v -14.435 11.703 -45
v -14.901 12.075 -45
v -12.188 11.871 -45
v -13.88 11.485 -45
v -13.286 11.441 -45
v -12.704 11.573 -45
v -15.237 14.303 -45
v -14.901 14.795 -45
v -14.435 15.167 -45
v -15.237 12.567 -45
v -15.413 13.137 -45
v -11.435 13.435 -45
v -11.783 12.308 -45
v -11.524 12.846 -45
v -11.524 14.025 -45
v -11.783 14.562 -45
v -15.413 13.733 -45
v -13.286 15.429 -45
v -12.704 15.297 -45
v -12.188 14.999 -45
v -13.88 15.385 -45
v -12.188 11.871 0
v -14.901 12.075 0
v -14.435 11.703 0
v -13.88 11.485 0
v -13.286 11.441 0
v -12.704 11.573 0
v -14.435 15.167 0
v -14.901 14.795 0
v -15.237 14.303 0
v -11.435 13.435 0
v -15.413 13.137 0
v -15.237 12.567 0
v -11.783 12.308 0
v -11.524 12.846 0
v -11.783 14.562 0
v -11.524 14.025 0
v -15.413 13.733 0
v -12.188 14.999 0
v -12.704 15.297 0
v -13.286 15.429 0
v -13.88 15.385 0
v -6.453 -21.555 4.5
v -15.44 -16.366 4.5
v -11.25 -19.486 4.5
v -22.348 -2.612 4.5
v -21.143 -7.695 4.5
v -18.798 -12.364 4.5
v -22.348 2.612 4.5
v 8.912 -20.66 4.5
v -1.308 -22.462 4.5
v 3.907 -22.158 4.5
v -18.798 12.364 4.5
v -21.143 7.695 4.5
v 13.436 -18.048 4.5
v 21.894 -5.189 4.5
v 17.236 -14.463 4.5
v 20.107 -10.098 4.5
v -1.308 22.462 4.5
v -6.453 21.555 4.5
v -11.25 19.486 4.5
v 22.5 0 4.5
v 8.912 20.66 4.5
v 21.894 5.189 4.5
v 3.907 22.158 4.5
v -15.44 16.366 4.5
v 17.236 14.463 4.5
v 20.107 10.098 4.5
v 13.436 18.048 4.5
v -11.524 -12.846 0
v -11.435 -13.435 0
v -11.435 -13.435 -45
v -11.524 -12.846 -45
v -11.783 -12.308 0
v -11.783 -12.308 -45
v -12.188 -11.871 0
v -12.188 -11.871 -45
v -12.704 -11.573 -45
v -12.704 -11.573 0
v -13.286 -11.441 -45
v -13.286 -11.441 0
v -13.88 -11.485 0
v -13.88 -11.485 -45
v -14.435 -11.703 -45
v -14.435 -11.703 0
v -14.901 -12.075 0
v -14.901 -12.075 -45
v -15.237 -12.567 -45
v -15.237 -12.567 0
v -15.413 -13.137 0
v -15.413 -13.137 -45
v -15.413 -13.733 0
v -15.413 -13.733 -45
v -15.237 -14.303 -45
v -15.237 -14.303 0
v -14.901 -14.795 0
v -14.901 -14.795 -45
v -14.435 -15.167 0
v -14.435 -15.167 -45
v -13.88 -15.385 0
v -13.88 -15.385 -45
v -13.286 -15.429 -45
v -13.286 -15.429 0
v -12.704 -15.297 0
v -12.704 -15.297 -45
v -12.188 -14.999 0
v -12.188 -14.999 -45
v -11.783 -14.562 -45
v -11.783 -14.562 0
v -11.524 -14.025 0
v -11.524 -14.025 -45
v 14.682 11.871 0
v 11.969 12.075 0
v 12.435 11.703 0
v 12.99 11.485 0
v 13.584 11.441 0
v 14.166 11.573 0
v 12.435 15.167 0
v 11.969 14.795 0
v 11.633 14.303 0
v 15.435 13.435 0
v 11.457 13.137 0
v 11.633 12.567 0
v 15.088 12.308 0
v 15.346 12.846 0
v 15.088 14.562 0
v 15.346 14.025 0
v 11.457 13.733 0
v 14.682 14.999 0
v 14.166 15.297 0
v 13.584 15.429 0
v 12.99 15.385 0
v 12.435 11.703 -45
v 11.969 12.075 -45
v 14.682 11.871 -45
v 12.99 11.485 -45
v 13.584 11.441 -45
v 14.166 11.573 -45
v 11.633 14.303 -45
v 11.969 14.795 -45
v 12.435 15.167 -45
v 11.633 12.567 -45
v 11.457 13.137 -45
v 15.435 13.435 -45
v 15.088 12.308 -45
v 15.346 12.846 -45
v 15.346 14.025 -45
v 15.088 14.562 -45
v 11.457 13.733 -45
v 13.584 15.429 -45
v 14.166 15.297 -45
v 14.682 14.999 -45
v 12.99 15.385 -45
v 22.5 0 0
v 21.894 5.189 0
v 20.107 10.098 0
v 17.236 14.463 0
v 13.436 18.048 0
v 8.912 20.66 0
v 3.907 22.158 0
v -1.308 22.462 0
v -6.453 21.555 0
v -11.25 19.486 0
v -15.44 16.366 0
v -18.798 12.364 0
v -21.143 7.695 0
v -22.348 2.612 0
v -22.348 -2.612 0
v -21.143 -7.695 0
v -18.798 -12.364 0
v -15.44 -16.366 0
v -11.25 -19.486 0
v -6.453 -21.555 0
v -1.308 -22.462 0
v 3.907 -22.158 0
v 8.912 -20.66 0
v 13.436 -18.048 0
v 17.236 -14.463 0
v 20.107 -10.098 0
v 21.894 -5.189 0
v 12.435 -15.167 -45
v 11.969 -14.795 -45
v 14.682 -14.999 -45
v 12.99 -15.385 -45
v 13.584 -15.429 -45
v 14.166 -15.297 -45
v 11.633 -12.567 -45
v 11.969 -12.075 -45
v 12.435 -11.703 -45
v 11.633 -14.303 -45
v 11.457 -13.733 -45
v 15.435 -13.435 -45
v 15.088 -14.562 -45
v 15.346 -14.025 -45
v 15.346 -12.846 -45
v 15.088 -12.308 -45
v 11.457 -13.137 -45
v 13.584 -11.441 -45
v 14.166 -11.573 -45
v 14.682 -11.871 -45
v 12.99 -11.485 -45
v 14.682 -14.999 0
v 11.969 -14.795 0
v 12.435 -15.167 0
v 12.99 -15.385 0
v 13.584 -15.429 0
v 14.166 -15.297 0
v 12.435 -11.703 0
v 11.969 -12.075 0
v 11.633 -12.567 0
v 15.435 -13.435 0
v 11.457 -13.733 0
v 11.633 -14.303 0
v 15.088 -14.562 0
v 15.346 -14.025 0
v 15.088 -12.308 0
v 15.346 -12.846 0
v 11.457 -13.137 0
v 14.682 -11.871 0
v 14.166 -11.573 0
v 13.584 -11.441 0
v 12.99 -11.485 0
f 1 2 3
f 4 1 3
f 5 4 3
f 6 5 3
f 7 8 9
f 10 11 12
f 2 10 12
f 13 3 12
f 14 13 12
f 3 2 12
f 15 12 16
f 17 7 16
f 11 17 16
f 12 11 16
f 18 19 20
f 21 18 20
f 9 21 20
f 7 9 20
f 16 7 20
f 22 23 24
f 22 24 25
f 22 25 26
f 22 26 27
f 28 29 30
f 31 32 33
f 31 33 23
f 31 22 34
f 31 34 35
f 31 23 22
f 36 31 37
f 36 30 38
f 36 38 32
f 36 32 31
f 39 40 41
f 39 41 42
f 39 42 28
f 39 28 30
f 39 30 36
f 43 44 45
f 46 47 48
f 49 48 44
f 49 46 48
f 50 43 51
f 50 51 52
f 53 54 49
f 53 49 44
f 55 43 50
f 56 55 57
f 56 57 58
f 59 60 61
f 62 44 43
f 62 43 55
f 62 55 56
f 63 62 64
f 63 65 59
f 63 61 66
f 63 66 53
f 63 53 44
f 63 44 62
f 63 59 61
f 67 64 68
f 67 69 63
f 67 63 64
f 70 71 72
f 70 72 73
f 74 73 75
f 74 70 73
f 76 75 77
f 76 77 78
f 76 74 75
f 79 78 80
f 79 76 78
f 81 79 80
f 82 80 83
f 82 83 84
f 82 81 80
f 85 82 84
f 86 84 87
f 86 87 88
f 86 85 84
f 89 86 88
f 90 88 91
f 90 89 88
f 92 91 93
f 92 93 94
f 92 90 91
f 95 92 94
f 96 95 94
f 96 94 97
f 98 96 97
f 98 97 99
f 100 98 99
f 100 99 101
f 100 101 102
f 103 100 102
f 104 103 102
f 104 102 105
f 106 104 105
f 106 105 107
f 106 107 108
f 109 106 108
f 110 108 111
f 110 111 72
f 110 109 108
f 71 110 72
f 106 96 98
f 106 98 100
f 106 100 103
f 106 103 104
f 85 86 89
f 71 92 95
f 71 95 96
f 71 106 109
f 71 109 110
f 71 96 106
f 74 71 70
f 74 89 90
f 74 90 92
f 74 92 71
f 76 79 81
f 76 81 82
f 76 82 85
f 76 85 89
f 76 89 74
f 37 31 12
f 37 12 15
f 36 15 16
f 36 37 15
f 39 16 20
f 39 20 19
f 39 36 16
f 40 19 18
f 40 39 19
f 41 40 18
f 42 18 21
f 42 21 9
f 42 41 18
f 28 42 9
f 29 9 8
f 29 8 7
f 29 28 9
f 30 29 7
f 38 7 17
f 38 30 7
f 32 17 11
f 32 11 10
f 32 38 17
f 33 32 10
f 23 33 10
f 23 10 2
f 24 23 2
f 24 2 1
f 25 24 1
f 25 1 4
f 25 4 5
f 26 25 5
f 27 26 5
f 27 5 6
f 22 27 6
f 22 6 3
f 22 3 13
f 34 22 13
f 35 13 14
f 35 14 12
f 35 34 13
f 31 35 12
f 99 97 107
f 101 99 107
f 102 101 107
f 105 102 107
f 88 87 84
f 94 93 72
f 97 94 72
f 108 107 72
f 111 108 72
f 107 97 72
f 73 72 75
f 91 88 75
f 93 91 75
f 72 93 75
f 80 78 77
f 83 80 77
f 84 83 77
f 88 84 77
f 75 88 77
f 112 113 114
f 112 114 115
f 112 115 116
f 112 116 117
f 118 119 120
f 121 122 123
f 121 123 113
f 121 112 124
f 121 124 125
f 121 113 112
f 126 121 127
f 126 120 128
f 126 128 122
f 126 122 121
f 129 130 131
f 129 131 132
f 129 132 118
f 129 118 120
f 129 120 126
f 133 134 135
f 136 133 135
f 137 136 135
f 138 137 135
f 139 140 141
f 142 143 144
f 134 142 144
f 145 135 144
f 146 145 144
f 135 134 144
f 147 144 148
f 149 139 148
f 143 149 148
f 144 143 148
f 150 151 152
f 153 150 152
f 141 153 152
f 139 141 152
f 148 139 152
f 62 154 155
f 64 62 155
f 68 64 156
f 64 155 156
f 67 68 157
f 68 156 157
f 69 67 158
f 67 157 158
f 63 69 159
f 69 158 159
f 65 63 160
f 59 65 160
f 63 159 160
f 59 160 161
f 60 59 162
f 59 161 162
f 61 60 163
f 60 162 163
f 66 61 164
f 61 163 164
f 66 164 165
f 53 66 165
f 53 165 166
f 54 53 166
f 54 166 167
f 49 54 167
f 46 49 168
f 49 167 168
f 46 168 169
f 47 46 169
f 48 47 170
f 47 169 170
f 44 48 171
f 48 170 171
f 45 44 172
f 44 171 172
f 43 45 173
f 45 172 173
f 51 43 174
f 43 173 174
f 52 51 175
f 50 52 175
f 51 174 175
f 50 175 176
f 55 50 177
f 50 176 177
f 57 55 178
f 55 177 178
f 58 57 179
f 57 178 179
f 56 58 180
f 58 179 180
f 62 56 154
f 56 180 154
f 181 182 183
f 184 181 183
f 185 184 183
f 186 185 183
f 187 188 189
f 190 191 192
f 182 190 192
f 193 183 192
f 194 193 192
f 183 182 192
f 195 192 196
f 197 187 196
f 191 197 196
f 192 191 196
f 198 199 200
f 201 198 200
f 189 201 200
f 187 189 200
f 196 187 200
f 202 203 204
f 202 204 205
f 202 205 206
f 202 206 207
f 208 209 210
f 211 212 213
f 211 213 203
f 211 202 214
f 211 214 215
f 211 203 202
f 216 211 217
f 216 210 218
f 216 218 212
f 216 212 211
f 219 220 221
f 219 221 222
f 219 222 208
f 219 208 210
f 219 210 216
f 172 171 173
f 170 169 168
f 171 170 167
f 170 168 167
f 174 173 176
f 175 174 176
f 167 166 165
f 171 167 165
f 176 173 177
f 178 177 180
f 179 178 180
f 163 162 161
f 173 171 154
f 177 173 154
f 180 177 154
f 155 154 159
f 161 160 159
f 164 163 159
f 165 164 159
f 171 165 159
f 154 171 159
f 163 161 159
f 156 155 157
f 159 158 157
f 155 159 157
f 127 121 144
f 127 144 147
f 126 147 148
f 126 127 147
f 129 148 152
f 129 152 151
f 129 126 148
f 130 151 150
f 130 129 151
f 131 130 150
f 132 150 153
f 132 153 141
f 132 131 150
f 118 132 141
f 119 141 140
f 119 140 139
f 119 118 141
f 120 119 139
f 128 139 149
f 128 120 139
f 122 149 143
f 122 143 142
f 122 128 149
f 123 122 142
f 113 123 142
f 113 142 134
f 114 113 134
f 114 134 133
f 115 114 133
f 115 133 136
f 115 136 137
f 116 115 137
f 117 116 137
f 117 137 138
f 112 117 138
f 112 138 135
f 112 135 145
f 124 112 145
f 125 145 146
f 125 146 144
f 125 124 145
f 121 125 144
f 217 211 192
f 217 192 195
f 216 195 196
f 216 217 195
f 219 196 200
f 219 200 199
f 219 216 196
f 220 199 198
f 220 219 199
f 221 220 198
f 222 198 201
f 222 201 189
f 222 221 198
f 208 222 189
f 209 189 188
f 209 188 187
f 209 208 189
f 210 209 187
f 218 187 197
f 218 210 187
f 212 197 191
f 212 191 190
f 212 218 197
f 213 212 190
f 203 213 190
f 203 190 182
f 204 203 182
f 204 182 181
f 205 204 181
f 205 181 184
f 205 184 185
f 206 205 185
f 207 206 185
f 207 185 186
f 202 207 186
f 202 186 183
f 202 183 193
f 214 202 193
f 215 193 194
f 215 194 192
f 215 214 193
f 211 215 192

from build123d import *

# Parameters (mm, degrees)
F0_R     = 22.5
F0_R_2   = 2
F1_DEPTH = 4.5
F2_DEPTH = 45


with BuildPart() as f1:
    # F0 (on Top) → F1 (new body)
    with BuildSketch(Plane.XY):
        Circle(F0_R)
        with Locations((-13.435029, -13.435029)):
            Circle(F0_R_2, mode=Mode.SUBTRACT)
        with Locations((13.435029, -13.435029)):
            Circle(F0_R_2, mode=Mode.SUBTRACT)
        with Locations((-13.435029, 13.435029)):
            Circle(F0_R_2, mode=Mode.SUBTRACT)
        with Locations((13.435029, 13.435029)):
            Circle(F0_R_2, mode=Mode.SUBTRACT)
        with Locations((-13.435029, 13.435029)):
            Circle(F0_R_2)
        with Locations((13.435029, 13.435029)):
            Circle(F0_R_2)
        with Locations((-13.435029, -13.435029)):
            Circle(F0_R_2)
        with Locations((13.435029, -13.435029)):
            Circle(F0_R_2)
    extrude(amount=F1_DEPTH)


with BuildPart() as f2:
    # F0 (on Top) → F2 (new body)
    with BuildSketch(Plane.XY):
        with Locations((-13.435029, -13.435029)):
            Circle(F0_R_2)
        with Locations((13.435029, -13.435029)):
            Circle(F0_R_2)
        with Locations((-13.435029, 13.435029)):
            Circle(F0_R_2)
        with Locations((13.435029, 13.435029)):
            Circle(F0_R_2)
    extrude(amount=-F2_DEPTH)


solid = Compound([f1.part, f2.part])
